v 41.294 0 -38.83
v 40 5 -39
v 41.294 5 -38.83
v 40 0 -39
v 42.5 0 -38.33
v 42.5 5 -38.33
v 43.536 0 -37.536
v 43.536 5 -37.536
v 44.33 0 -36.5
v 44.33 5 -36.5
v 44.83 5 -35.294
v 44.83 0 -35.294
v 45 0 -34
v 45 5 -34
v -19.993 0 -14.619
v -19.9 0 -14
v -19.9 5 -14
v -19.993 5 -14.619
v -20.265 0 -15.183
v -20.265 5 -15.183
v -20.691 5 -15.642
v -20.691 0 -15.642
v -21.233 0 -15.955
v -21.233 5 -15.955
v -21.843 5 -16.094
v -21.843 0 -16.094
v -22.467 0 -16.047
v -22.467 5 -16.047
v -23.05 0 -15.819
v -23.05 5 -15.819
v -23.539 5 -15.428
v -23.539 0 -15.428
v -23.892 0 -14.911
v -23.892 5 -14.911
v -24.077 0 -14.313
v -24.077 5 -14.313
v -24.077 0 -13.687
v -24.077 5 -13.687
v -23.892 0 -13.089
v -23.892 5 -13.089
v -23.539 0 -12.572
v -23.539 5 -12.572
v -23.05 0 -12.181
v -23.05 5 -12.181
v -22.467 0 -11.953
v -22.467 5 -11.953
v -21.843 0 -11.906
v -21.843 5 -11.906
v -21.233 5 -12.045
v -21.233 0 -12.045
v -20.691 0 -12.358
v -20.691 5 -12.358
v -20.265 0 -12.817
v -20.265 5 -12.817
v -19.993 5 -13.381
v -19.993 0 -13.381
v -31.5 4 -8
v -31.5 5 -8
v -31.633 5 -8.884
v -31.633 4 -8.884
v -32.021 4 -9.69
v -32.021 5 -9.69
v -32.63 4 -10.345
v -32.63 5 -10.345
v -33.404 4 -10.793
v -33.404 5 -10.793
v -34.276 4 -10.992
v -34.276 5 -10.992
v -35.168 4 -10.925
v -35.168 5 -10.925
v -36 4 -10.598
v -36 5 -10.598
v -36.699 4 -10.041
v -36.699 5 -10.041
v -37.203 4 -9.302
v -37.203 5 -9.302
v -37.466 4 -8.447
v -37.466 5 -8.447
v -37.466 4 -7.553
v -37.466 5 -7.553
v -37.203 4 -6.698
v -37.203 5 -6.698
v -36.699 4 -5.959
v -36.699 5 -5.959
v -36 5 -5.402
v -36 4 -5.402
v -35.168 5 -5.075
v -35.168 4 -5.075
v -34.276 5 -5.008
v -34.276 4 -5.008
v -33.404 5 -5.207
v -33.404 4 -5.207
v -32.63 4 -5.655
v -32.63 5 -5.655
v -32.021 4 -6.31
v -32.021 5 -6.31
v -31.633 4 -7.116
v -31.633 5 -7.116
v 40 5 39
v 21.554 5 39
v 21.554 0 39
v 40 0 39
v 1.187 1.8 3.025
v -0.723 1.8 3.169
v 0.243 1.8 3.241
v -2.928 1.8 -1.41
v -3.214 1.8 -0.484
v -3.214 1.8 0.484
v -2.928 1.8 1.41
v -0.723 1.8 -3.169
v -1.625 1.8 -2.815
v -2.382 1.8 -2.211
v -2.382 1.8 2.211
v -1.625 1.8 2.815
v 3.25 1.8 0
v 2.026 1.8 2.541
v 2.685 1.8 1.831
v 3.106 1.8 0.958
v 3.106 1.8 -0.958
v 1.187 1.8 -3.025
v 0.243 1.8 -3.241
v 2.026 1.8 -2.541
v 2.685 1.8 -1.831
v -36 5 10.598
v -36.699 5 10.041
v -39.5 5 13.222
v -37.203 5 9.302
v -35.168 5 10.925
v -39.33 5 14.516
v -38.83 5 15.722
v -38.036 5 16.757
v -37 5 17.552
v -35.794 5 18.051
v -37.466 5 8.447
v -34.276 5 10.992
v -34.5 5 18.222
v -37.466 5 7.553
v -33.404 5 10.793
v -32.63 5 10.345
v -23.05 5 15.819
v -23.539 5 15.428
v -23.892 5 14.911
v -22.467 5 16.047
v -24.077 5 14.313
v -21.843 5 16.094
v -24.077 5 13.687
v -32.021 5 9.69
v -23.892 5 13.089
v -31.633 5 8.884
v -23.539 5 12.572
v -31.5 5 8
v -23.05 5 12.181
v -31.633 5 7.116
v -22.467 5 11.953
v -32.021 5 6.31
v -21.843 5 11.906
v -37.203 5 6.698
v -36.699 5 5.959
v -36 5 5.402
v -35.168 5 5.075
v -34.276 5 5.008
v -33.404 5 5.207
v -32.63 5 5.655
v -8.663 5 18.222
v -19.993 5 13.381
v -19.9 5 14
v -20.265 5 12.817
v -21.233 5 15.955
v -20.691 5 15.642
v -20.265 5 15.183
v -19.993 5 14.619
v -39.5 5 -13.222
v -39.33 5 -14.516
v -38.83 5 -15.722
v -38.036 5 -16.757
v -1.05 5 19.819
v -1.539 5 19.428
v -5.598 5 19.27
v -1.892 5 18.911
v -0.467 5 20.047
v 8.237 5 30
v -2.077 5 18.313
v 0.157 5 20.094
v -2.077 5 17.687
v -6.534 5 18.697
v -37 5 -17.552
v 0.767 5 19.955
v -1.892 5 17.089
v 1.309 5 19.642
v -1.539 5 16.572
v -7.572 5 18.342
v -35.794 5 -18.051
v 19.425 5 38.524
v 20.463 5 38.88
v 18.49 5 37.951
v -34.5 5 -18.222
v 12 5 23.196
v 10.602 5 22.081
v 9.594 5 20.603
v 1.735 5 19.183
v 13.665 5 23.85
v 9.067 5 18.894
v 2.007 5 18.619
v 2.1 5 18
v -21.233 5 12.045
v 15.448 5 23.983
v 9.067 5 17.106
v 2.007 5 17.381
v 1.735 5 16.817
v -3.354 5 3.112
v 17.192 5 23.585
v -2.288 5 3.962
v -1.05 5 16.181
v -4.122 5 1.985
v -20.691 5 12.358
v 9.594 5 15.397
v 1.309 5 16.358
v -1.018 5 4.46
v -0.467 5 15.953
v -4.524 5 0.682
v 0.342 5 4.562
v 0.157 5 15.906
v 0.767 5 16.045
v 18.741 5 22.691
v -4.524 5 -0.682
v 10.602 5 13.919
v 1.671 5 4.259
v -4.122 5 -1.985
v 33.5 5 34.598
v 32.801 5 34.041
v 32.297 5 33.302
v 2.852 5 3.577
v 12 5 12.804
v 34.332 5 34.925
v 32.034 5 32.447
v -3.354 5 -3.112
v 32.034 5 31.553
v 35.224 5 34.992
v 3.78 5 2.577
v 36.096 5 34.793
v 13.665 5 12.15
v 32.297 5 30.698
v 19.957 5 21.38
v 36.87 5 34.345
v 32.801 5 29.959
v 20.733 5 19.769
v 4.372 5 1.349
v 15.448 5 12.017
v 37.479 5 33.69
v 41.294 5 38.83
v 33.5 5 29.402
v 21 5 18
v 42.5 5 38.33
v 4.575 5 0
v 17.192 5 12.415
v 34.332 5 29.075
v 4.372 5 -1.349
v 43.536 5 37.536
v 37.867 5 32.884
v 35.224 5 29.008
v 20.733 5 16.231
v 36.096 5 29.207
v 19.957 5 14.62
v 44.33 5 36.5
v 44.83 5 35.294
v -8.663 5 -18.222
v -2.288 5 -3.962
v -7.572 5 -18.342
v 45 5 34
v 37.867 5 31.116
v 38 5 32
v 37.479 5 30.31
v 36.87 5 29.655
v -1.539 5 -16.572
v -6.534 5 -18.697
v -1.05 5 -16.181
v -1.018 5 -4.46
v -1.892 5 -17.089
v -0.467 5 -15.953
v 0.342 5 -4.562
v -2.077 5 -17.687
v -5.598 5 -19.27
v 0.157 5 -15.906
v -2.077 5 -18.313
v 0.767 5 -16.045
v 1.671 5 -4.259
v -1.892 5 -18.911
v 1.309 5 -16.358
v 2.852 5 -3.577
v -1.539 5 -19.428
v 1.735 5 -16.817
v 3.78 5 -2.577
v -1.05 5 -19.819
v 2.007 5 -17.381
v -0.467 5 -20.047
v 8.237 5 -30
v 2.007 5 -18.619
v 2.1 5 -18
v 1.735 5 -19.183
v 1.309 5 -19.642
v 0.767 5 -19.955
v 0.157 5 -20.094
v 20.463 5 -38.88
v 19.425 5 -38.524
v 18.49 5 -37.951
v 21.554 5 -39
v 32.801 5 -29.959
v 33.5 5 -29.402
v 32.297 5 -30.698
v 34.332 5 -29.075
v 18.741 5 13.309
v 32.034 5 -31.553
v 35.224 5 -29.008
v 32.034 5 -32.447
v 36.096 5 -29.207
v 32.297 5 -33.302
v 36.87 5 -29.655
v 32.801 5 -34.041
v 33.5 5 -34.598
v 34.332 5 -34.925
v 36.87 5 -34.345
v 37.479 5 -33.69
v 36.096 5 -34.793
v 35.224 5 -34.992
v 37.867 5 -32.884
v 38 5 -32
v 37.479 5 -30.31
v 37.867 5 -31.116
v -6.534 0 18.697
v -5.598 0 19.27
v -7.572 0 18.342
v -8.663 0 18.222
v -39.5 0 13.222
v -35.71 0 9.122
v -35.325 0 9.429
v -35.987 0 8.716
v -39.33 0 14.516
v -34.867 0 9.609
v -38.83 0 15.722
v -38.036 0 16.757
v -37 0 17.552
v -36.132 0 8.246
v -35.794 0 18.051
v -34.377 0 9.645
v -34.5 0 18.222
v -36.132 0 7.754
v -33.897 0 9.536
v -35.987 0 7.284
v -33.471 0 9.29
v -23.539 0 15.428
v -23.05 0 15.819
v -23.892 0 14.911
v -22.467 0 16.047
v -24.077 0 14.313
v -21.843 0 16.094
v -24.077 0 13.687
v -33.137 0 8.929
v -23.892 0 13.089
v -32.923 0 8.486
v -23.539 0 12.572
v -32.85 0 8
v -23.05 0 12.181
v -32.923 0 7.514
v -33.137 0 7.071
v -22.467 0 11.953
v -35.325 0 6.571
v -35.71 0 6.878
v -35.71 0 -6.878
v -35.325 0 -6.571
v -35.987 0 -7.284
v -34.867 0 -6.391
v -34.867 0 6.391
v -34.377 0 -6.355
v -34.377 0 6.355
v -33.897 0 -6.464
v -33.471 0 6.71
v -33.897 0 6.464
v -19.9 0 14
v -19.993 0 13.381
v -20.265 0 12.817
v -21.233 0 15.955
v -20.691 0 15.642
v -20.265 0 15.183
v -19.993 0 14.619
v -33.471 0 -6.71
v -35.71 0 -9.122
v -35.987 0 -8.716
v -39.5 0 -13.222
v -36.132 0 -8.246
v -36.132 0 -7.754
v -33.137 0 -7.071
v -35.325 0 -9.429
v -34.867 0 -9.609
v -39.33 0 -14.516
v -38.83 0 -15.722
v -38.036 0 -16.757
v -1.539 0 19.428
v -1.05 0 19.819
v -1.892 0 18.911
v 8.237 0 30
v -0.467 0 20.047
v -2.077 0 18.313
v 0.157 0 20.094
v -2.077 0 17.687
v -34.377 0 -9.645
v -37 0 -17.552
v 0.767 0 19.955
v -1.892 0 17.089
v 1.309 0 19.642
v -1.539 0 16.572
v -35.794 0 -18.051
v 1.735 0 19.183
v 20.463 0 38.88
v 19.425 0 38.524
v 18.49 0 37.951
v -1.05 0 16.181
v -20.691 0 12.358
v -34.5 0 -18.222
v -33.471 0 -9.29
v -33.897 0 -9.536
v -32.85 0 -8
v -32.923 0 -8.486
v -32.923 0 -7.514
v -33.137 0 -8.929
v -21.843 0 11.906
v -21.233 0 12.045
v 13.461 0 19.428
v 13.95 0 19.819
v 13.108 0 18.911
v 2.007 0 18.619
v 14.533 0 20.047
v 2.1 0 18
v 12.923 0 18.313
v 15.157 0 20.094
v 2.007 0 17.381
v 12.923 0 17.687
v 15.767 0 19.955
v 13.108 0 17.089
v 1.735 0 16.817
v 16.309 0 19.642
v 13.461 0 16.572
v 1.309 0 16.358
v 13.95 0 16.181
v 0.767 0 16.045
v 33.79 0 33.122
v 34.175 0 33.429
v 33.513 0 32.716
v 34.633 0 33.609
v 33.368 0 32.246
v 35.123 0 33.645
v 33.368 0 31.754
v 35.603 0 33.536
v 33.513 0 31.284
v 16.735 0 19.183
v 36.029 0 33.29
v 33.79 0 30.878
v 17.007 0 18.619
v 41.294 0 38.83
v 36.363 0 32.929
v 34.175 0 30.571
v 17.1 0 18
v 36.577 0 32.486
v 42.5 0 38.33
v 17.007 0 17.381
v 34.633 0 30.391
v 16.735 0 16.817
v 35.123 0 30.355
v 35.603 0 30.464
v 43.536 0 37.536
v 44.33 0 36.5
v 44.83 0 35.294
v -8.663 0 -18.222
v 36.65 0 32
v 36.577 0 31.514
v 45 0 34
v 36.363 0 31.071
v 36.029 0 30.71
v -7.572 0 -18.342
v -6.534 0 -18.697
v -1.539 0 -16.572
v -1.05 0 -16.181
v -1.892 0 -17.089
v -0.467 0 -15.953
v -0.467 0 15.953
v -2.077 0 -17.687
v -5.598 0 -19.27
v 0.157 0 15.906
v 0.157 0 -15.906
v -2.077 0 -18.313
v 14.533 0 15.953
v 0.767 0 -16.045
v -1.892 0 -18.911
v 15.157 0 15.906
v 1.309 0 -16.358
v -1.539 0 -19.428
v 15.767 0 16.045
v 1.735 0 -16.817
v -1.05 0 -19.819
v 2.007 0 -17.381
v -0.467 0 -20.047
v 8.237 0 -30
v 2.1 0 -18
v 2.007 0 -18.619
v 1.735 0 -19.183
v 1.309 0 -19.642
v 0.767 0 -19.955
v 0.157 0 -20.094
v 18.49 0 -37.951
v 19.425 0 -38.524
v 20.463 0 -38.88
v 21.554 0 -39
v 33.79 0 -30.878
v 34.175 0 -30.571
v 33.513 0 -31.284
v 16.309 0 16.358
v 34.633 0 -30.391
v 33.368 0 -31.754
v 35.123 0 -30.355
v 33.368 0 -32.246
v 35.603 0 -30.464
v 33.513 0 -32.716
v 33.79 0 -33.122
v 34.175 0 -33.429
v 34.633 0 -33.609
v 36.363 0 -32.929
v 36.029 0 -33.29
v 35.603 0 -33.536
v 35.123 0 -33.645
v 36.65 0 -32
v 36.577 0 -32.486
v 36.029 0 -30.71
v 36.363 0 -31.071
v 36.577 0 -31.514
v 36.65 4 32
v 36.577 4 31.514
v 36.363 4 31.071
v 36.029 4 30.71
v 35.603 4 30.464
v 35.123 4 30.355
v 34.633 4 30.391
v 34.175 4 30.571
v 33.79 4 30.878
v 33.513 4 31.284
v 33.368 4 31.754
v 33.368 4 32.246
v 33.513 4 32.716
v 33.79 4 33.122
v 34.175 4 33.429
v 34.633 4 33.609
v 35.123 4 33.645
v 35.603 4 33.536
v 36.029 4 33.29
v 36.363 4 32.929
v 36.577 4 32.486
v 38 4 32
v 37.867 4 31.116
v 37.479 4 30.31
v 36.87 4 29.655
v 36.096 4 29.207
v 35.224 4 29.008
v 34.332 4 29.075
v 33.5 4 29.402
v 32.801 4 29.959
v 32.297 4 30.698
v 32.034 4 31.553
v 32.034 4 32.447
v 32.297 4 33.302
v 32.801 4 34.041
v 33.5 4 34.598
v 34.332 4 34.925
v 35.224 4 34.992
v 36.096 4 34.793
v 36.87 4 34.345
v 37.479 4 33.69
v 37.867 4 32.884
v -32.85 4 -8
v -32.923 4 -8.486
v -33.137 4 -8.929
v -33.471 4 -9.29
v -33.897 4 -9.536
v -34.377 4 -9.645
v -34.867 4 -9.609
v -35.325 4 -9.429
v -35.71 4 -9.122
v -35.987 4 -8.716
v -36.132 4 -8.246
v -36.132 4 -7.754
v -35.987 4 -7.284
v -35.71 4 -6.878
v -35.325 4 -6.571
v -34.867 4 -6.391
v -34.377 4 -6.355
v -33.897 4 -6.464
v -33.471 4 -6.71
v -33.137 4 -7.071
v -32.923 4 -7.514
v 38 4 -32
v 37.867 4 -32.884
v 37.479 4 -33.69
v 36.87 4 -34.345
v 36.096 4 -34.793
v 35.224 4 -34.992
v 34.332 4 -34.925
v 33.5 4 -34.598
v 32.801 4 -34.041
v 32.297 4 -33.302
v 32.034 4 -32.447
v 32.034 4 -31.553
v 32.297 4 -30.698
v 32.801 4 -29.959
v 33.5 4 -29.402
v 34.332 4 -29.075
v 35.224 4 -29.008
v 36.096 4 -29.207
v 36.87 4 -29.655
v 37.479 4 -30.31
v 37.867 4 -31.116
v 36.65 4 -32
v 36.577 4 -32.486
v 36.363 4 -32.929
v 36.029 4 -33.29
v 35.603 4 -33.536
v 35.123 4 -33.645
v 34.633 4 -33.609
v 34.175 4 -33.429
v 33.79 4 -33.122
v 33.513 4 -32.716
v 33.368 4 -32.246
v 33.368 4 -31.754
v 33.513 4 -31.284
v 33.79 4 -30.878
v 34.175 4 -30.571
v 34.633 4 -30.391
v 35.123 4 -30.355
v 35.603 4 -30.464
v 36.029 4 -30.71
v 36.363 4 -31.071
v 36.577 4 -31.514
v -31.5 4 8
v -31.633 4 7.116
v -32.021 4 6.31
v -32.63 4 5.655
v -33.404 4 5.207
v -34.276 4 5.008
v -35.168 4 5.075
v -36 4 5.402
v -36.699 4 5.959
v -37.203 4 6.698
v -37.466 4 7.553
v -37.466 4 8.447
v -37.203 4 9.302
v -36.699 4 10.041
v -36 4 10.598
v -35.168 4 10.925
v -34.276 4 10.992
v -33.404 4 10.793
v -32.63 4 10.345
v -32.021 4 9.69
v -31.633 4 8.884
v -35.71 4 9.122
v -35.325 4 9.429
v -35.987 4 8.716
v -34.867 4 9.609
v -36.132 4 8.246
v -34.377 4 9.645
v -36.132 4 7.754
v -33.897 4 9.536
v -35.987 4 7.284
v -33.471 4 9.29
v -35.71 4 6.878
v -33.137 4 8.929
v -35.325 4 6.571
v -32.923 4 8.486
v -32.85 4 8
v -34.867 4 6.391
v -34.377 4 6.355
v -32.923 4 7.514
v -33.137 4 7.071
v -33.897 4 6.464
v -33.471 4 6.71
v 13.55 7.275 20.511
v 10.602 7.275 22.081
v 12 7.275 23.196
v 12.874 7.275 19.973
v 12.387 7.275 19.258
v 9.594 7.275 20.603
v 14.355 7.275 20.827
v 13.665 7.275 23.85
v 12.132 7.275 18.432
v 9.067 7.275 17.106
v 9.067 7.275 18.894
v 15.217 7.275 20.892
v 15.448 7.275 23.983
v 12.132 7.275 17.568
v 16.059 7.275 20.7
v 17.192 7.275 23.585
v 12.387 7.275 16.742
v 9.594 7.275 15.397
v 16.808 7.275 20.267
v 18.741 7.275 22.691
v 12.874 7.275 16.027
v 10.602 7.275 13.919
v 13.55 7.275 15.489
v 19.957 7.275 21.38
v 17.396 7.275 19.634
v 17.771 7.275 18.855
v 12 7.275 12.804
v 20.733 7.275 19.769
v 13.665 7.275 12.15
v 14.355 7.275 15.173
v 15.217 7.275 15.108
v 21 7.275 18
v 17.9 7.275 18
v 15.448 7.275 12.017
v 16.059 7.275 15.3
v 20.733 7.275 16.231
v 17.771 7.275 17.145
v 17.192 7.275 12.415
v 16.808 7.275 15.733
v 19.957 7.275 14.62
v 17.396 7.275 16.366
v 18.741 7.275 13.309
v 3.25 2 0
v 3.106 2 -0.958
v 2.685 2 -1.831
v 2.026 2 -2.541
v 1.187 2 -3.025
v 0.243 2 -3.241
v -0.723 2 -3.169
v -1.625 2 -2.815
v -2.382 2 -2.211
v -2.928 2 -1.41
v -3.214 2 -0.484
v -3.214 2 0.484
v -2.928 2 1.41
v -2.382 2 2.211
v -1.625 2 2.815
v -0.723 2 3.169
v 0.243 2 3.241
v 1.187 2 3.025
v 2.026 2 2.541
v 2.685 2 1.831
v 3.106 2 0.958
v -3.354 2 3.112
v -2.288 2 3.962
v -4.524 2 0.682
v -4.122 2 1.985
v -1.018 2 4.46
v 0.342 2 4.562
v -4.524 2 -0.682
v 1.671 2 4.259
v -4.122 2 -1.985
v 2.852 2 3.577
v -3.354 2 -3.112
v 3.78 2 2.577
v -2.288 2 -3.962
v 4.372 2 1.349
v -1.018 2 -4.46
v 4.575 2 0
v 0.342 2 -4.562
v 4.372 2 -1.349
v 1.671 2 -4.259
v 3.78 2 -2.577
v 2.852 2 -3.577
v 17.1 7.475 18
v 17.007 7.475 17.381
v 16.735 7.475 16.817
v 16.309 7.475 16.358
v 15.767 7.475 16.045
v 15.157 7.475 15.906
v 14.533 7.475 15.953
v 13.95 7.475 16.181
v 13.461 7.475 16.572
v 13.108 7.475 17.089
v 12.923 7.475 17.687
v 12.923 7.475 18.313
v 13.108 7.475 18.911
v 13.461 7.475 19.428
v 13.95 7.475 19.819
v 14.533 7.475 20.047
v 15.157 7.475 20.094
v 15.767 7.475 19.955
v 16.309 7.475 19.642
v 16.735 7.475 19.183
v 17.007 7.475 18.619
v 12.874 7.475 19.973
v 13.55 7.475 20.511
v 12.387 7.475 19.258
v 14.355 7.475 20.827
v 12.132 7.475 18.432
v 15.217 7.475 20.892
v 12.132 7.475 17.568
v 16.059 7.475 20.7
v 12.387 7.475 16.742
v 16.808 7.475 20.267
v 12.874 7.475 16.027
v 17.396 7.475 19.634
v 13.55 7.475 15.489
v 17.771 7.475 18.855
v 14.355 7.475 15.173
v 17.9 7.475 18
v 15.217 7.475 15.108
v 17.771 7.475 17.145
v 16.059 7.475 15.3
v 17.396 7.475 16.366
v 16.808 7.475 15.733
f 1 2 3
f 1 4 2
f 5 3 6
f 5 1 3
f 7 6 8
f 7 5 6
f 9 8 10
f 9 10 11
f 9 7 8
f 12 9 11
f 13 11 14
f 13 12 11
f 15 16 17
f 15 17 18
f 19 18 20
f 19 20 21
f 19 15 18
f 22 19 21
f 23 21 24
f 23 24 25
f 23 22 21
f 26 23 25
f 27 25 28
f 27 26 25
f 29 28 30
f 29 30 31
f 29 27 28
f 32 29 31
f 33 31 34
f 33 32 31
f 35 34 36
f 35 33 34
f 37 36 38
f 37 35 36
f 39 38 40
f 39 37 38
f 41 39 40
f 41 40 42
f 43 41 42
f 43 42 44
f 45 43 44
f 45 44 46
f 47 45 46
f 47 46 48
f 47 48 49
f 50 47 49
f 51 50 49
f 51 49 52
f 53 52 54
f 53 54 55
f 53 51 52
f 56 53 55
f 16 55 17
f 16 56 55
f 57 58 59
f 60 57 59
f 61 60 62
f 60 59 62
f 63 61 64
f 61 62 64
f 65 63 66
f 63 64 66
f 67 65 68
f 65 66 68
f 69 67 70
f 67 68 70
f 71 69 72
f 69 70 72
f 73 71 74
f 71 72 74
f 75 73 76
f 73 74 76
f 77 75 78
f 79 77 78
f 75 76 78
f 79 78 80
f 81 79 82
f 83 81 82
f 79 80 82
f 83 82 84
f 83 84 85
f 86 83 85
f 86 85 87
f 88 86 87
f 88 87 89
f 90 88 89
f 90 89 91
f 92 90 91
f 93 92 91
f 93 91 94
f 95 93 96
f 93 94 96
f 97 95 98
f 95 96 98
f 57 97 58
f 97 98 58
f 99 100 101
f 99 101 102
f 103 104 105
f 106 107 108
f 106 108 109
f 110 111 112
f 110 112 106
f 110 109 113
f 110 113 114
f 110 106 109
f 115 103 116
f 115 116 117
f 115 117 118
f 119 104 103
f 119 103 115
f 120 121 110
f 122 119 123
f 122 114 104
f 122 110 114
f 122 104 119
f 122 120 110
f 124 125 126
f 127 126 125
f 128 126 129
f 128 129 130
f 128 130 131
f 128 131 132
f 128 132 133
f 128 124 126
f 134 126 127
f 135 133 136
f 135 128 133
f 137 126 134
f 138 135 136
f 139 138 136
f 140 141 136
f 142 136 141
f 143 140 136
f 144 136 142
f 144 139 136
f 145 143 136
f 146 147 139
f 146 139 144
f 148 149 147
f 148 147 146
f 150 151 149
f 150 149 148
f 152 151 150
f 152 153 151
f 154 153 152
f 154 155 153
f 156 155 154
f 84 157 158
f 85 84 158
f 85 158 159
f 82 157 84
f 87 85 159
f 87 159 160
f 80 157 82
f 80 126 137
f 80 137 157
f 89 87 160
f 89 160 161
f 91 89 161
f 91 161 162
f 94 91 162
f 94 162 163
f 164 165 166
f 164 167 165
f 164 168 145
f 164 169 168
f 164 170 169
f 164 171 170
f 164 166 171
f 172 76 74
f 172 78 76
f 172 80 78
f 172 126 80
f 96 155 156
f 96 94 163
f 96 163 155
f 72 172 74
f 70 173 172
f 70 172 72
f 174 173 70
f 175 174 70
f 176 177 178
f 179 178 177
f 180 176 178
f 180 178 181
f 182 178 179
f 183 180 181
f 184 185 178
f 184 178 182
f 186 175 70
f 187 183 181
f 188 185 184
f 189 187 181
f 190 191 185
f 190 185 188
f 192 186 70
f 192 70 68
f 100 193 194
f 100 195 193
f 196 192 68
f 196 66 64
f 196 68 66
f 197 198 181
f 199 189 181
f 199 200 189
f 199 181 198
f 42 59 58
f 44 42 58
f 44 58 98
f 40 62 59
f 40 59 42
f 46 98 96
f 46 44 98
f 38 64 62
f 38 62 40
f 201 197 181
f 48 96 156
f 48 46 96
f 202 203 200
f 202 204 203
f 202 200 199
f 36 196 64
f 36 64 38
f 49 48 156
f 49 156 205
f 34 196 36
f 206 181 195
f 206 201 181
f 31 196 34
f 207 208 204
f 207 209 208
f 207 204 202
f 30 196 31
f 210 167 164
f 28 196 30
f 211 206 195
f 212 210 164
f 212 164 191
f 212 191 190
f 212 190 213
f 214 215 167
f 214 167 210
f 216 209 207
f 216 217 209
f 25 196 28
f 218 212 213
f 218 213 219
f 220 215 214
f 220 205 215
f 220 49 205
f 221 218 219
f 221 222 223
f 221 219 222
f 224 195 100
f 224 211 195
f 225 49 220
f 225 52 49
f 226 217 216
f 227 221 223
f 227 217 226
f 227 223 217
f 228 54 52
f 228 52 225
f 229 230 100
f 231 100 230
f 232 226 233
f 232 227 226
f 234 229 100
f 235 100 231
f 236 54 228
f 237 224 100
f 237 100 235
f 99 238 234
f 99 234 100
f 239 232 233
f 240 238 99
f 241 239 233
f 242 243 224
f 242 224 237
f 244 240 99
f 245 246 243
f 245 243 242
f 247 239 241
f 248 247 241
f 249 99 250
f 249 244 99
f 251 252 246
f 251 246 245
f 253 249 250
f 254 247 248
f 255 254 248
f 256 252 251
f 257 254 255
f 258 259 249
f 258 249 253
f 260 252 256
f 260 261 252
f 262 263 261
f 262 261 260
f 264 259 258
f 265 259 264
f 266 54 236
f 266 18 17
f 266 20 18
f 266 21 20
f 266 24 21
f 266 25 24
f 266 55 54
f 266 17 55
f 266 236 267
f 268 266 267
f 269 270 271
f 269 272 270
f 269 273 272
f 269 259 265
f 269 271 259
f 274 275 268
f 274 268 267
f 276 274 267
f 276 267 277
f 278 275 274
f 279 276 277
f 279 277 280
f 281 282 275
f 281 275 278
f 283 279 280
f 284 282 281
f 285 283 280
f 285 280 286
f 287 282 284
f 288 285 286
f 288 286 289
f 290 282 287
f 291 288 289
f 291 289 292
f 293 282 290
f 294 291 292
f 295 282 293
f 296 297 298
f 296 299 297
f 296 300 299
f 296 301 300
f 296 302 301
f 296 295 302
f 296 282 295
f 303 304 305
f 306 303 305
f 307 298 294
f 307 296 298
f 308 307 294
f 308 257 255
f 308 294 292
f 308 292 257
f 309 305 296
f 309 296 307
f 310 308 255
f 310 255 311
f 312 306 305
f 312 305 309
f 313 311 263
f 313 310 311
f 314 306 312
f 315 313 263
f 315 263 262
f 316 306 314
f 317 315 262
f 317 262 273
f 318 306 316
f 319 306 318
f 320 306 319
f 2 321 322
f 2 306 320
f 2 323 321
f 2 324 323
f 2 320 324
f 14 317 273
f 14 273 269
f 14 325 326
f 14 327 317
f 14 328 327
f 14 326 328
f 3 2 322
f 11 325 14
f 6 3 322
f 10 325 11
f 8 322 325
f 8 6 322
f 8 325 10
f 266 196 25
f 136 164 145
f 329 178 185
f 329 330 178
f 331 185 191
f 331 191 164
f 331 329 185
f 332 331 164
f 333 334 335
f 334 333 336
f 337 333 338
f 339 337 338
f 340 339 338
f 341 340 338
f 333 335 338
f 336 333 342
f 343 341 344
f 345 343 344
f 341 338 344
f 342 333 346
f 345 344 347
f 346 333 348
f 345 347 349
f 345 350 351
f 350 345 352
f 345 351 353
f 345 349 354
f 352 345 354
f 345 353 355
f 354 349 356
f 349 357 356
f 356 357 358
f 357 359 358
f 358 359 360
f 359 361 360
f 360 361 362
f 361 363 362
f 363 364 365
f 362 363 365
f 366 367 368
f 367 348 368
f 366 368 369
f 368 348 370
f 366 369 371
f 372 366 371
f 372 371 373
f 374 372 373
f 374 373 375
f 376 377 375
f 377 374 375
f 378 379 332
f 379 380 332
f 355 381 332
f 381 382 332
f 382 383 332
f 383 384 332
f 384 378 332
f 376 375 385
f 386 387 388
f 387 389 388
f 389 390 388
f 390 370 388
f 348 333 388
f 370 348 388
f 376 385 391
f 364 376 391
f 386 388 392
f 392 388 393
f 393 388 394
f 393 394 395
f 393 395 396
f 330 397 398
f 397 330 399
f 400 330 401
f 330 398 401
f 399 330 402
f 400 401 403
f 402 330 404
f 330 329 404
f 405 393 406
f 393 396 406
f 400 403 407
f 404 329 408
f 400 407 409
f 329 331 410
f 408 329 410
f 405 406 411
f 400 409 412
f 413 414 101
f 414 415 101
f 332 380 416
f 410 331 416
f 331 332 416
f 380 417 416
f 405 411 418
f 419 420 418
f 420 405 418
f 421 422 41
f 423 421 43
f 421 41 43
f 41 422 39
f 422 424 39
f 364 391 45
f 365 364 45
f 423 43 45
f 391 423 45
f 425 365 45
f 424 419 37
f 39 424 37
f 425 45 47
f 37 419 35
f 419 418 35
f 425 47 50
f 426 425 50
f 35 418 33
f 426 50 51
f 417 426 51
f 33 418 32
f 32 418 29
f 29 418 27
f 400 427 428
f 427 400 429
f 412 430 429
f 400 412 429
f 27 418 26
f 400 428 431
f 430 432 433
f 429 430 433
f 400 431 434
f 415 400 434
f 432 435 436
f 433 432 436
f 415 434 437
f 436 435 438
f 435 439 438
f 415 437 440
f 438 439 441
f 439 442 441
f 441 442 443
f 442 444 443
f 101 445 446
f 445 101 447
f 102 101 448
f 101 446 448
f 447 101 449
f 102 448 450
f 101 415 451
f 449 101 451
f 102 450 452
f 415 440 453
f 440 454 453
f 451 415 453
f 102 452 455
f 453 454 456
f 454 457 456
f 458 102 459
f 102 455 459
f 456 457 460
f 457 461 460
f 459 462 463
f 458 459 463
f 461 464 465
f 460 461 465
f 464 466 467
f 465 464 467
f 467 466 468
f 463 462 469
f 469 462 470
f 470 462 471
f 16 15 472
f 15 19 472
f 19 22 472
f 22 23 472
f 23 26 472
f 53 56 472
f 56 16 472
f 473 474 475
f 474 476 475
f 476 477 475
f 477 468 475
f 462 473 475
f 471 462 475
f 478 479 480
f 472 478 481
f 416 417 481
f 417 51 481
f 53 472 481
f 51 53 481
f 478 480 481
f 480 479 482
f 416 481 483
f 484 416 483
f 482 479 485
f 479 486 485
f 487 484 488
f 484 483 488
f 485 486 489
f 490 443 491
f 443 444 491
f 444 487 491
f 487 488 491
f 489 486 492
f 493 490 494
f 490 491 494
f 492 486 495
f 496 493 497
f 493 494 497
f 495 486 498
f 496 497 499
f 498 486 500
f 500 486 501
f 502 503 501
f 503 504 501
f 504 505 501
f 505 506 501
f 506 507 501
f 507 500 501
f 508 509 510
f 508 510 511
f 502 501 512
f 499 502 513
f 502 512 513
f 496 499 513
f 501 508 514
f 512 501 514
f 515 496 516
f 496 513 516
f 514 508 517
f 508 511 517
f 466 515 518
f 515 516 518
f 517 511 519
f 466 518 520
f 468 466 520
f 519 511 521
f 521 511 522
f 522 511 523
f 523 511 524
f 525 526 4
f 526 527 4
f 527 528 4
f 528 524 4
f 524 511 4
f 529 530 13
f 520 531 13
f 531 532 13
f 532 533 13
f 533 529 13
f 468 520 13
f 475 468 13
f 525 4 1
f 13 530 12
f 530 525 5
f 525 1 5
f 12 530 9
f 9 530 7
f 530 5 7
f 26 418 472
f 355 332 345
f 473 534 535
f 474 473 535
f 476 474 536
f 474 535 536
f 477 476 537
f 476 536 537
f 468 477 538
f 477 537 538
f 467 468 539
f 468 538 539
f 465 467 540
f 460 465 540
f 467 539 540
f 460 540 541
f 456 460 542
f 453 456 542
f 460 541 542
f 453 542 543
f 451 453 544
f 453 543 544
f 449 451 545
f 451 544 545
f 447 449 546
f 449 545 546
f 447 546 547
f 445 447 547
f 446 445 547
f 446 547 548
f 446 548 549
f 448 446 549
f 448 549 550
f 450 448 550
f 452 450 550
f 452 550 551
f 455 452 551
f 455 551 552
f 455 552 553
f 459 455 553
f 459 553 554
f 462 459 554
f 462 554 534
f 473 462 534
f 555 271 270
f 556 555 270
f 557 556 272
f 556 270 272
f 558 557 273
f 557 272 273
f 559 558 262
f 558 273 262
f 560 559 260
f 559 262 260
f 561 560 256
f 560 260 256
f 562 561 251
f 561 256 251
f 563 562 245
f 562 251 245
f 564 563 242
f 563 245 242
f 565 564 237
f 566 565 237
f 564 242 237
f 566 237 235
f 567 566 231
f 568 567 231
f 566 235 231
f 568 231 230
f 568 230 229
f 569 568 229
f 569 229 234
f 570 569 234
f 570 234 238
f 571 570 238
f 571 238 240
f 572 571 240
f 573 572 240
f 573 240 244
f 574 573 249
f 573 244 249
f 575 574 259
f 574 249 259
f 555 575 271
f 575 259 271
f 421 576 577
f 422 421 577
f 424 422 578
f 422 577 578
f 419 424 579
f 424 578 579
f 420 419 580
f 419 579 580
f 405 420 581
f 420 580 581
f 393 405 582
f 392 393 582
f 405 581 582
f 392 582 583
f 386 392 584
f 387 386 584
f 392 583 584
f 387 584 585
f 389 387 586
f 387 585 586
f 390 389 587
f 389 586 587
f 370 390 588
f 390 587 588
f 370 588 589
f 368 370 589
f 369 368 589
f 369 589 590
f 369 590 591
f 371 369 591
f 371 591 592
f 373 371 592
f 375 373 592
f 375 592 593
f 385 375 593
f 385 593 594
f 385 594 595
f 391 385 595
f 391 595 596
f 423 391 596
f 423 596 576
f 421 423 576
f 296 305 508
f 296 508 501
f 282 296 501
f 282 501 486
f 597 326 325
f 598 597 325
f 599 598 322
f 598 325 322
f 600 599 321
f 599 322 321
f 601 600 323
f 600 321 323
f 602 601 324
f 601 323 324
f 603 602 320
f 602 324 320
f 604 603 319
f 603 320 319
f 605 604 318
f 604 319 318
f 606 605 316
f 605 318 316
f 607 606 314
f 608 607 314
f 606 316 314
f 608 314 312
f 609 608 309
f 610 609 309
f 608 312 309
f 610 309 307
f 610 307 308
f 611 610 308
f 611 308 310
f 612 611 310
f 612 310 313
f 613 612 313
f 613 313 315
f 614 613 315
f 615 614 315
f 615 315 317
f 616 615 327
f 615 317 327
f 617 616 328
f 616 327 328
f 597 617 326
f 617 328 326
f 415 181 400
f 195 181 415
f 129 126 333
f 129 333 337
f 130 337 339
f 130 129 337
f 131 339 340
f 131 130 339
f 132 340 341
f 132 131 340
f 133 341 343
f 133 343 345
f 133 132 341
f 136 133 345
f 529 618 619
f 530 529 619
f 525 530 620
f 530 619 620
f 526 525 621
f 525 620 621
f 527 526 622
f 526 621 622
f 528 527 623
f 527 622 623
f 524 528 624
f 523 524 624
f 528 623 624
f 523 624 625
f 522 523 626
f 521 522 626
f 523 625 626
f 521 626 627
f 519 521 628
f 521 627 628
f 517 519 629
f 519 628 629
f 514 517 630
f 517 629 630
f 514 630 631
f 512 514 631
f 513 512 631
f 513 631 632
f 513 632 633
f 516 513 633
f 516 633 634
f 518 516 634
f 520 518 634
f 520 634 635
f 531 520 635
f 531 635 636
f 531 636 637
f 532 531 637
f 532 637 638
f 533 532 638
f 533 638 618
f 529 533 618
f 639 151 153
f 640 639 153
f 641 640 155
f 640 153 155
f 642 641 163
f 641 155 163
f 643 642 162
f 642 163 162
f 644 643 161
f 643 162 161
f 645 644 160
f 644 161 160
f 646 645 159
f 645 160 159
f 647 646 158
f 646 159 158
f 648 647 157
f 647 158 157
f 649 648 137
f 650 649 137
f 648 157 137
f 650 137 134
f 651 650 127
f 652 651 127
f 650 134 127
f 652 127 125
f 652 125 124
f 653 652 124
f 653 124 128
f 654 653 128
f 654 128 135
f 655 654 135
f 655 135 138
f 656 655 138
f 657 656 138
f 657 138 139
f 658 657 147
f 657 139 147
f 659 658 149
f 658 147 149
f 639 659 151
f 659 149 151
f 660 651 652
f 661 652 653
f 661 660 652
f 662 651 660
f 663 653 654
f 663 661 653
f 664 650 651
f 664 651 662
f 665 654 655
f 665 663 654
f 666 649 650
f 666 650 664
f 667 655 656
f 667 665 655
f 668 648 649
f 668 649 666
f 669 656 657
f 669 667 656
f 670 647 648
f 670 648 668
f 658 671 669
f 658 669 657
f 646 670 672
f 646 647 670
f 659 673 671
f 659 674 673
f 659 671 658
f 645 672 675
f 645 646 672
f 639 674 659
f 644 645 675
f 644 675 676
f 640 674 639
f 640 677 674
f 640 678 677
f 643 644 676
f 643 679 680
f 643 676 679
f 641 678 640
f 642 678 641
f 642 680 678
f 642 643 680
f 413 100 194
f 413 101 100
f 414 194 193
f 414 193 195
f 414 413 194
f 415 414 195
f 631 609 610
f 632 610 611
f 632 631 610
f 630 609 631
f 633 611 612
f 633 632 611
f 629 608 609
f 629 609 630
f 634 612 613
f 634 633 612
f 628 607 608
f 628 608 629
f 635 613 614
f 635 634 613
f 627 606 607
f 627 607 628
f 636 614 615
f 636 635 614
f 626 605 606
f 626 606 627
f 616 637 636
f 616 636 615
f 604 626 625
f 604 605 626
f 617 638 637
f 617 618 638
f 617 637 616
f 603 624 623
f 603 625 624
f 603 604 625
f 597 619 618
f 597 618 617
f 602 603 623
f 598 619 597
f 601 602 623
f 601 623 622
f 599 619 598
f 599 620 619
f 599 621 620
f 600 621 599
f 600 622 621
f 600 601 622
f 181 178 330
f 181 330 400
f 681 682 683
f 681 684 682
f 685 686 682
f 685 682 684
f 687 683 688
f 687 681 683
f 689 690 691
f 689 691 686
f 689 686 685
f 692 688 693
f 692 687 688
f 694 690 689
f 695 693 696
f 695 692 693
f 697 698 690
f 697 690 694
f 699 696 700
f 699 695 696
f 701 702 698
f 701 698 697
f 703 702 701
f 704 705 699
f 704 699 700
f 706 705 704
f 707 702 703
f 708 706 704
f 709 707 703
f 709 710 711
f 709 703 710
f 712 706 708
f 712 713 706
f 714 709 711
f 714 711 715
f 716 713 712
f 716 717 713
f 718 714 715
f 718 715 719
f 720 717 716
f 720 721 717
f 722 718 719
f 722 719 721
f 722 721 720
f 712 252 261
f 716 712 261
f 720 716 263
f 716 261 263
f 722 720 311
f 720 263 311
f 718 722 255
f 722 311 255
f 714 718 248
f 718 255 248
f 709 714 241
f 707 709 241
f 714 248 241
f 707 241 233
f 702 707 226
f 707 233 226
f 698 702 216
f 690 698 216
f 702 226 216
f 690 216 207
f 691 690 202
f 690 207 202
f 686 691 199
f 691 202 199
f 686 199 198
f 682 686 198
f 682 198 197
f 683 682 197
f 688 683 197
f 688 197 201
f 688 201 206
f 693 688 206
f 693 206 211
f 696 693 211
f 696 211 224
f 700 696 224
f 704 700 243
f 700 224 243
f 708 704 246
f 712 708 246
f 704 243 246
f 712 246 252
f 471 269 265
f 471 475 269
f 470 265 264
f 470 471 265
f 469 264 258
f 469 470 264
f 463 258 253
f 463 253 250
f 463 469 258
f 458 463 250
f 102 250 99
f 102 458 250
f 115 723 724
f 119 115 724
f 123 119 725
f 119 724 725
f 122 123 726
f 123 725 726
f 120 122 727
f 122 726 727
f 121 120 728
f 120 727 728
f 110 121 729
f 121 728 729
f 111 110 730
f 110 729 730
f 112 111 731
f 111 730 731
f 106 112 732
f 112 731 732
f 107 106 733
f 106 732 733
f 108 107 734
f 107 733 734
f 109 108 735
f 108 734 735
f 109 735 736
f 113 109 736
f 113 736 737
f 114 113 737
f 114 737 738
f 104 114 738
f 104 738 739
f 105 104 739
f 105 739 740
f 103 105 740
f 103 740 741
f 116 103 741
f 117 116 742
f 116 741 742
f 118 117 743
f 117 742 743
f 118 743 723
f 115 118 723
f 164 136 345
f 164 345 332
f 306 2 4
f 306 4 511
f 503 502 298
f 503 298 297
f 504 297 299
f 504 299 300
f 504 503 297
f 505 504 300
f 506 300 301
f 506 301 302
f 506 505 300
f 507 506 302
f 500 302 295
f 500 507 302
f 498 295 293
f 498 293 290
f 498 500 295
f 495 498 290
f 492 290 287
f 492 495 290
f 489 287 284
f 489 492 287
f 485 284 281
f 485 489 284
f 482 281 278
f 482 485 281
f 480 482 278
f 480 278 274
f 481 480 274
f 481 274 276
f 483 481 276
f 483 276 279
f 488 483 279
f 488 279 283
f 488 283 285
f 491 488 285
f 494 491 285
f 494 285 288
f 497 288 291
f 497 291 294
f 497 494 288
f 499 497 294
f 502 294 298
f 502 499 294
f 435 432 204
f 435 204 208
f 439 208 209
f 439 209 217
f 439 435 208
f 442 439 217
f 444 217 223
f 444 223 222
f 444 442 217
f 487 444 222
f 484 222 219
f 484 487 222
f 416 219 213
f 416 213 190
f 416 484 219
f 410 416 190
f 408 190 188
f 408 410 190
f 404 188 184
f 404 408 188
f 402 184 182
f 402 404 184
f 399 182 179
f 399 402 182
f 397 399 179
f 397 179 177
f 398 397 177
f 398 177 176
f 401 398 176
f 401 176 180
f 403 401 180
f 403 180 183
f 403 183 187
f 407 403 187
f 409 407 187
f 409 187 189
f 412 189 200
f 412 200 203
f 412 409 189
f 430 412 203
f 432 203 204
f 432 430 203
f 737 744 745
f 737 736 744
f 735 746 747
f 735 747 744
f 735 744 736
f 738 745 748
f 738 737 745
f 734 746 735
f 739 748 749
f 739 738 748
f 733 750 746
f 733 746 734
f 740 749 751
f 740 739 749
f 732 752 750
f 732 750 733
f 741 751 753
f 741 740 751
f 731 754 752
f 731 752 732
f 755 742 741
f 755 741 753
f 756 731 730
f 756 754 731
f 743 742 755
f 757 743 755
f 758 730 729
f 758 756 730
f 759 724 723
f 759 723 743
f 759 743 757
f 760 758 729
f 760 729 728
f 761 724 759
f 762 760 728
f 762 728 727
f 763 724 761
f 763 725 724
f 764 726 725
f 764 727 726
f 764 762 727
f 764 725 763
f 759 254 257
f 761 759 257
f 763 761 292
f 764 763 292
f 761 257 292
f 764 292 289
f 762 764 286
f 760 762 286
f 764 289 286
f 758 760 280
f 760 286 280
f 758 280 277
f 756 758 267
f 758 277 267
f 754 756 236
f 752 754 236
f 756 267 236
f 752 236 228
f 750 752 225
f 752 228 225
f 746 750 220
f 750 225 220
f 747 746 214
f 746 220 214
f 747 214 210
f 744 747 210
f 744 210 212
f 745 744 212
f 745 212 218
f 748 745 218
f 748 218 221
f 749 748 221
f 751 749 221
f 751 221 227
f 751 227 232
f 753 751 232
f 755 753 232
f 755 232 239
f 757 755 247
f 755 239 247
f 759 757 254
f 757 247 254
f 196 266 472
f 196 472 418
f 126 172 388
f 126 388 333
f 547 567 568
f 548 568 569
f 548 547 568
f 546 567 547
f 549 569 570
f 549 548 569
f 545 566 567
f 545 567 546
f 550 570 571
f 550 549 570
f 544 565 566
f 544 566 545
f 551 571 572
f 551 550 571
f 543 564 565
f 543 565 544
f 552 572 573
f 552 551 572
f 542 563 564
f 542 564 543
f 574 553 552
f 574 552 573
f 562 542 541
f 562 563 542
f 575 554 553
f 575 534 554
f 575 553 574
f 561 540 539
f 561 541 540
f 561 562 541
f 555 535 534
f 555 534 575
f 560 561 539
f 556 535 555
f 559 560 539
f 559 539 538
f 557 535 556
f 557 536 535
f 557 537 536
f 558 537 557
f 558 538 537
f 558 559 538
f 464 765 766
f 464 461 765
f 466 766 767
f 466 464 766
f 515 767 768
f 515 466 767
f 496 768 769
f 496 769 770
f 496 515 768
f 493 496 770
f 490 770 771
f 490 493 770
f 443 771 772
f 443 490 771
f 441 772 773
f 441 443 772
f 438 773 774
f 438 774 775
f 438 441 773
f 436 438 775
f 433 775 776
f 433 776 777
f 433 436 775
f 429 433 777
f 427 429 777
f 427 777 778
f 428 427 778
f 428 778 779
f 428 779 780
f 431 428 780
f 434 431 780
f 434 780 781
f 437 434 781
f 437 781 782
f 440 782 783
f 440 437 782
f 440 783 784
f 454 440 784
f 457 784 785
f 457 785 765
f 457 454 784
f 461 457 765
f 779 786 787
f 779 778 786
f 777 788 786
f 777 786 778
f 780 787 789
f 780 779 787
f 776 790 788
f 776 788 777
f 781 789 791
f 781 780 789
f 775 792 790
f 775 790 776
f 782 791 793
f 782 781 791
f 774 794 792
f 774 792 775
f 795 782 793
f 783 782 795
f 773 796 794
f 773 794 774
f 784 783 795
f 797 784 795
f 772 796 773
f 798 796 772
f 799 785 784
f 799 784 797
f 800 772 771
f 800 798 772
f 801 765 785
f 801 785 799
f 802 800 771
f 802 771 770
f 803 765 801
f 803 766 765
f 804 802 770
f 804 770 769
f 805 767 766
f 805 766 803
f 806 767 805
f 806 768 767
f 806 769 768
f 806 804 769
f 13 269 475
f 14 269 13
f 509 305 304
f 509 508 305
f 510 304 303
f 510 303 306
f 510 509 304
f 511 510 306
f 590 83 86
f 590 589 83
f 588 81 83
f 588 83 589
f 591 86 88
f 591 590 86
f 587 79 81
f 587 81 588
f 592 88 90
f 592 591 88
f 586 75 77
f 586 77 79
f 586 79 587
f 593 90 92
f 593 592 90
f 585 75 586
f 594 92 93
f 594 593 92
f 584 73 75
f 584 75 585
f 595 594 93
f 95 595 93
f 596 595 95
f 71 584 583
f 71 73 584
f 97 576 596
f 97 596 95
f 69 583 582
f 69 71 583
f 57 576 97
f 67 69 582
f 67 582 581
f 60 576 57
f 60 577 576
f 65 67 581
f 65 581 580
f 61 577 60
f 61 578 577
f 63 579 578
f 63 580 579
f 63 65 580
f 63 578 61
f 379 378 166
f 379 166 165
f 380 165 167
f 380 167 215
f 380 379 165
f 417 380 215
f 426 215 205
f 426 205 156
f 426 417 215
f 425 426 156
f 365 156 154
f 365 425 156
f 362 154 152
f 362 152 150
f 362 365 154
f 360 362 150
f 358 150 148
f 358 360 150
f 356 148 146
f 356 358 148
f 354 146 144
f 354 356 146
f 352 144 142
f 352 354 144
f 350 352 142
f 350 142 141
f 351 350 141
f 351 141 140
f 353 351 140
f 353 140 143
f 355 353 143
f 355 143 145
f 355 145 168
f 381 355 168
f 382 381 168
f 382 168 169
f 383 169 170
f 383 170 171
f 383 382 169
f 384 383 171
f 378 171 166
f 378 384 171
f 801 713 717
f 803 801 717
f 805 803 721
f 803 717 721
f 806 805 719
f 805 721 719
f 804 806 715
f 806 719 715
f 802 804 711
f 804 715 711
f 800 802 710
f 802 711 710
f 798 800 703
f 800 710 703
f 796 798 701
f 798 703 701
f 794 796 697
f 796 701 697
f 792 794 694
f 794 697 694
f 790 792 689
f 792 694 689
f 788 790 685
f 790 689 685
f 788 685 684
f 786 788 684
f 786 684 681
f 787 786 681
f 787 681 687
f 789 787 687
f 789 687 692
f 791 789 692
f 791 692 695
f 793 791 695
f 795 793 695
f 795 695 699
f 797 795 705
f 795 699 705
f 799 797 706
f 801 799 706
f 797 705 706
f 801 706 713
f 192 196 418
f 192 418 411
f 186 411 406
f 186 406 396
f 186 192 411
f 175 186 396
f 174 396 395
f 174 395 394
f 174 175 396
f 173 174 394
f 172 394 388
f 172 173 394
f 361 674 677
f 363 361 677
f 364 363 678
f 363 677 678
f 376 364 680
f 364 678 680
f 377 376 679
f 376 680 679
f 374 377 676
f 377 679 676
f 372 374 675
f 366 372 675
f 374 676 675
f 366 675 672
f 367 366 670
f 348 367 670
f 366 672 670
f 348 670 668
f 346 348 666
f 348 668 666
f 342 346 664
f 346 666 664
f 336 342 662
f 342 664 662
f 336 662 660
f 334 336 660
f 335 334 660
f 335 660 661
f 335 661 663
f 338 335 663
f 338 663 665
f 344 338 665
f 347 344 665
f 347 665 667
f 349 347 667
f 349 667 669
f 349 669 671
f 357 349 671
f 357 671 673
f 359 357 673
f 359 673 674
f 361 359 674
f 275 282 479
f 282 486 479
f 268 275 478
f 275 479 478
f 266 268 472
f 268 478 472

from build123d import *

# Parameters (mm, degrees)
SKETCH1_W           = 115
SKETCH1_H           = 60
SKETCH1_R           = 2.1
BOSS_EXTRUDE1_DEPTH = 5
SKETCH2_R           = 4.575
CUT_EXTRUDE1_DEPTH  = 3
SKETCH3_R           = 3.25
CUT_EXTRUDE2_DEPTH  = 0.2
SKETCH4_R           = 1.65
CUT_EXTRUDE3_DEPTH  = 6
CUT_EXTRUDE4_DEPTH  = 6
BOSS_EXTRUDE2_DEPTH = 5
SKETCH8_R           = 1.65
CUT_EXTRUDE5_DEPTH  = 6
FILLET1_R           = 5
SKETCH9_R           = 6
SKETCH9_R_2         = 2.1
BOSS_EXTRUDE3_DEPTH = 2.275
SKETCH10_R          = 2.9
SKETCH10_R_2        = 2.1
BOSS_EXTRUDE4_DEPTH = 0.2
SKETCH11_R          = 3
CUT_EXTRUDE6_DEPTH  = 1


with BuildPart() as part:
    # Sketch1 → Boss-Extrude1 (new body)
    with BuildSketch(Plane(origin=(0, 0, 0), x_dir=(1, 0, 0), z_dir=(0, 1, 0))):
        with Locations((-12.5, 0)):
            Rectangle(SKETCH1_W, SKETCH1_H)
        with Locations((-22, 14)):
            Circle(SKETCH1_R, mode=Mode.SUBTRACT)
        with Locations((0, 18)):
            Circle(SKETCH1_R, mode=Mode.SUBTRACT)
        with Locations((0, -18)):
            Circle(SKETCH1_R, mode=Mode.SUBTRACT)
        with Locations((-22, -14)):
            Circle(SKETCH1_R, mode=Mode.SUBTRACT)
        with Locations((15, -18)):
            Circle(SKETCH1_R, mode=Mode.SUBTRACT)
    extrude(amount=BOSS_EXTRUDE1_DEPTH)

    # Sketch2 → Cut-Extrude1 (cut)
    with BuildSketch(Plane(origin=(0, 5, 0), x_dir=(1, 0, 0), z_dir=(0, 1, 0))):
        Circle(SKETCH2_R)
    extrude(amount=-CUT_EXTRUDE1_DEPTH, mode=Mode.SUBTRACT)

    # Sketch3 → Cut-Extrude2 (cut)
    with BuildSketch(Plane(origin=(0, 2, 0), x_dir=(1, 0, 0), z_dir=(0, 1, 0))):
        Circle(SKETCH3_R)
    extrude(amount=-CUT_EXTRUDE2_DEPTH, mode=Mode.SUBTRACT)

    # Sketch4 → Cut-Extrude3 (cut, through all)
    with BuildSketch(Plane(origin=(0, 5, 0), x_dir=(1, 0, 0), z_dir=(0, 1, 0))):
        with Locations((-34.5, -8)):
            Circle(SKETCH4_R)
        with Locations((-34.5, 8)):
            Circle(SKETCH4_R)
    extrude(amount=-CUT_EXTRUDE3_DEPTH, mode=Mode.SUBTRACT)

    # Sketch6 → Cut-Extrude4 (cut, through all)
    with BuildSketch(Plane(origin=(0, 5, 0), x_dir=(1, 0, 0), z_dir=(0, 1, 0))):
        with BuildLine():
            Line((-22, 18.221576202), (-34.5, 18.221576202))
            ThreePointArc((-34.5, 18.221576202), (-38.035533906, 16.757110108), (-39.5, 13.221576202))
            Line((-39.5, 13.221576202), (-39.5, -13.221576202))
            ThreePointArc((-39.5, -13.221576202), (-38.035533906, -16.757110108), (-34.5, -18.221576202))
            Line((-34.5, -18.221576202), (-22, -18.221576202))
            Line((-22, -18.221576202), (-8.297519941, -18.221576202))
            Line((-8.297519941, -18.221576202), (-6.951019319, -18.221576202))
            Line((-6.951019319, -18.221576202), (19.301199277, -38.580439602))
            Line((19.301199277, -38.580439602), (-22, -30))
            Line((-22, -30), (-70, -30))
            Line((-70, -30), (-70, 30))
            Line((-70, 30), (-22, 30))
            Line((-22, 30), (19.301199277, 38.580439602))
            Line((19.301199277, 38.580439602), (-6.951019319, 18.221576202))
            Line((-6.951019319, 18.221576202), (-8.297519941, 18.221576202))
            Line((-8.297519941, 18.221576202), (-22, 18.221576202))
        make_face()
    extrude(amount=-CUT_EXTRUDE4_DEPTH, mode=Mode.SUBTRACT)

    # Sketch7 → Boss-Extrude2 (add)
    with BuildSketch(Plane(origin=(0, 5, 0), x_dir=(1, 0, 0), z_dir=(0, 1, 0))):
        Polygon((19.842211368, 39), (8.23694821, 30), (45, 30), (45, 39), align=None)
        Polygon((45, -30), (8.23694821, -30), (19.842211368, -39), (45, -39), align=None)
    extrude(amount=-BOSS_EXTRUDE2_DEPTH)

    # Sketch8 → Cut-Extrude5 (cut, through all)
    with BuildSketch(Plane(origin=(0, 5, 0), x_dir=(1, 0, 0), z_dir=(0, 1, 0))):
        with Locations((35, 32)):
            Circle(SKETCH8_R)
        with Locations((35, -32)):
            Circle(SKETCH8_R)
    extrude(amount=-CUT_EXTRUDE5_DEPTH, mode=Mode.SUBTRACT)

    # Fillet1
    fillet1_edges = [part.edges().sort_by_distance(p)[0] for p in [
        (45, 2.5, -39),
        (19.842211368, 2.5, -39),
        (19.842211368, 2.5, 39),
        (45, 2.5, 39),
        (-6.951019319, 2.5, 18.221576202),
        (-6.951019319, 2.5, -18.221576202),
    ]]
    fillet(fillet1_edges, radius=FILLET1_R)

    # Sketch9 → Boss-Extrude3 (add)
    with BuildSketch(Plane(origin=(0, 5, 0), x_dir=(1, 0, 0), z_dir=(0, 1, 0))):
        with Locations((15, -18)):
            Circle(SKETCH9_R)
        with Locations((15, -18)):
            Circle(SKETCH9_R_2, mode=Mode.SUBTRACT)
    extrude(amount=BOSS_EXTRUDE3_DEPTH)

    # Sketch10 → Boss-Extrude4 (add)
    with BuildSketch(Plane(origin=(0, 7.275, 0), x_dir=(1, 0, 0), z_dir=(0, 1, 0))):
        with Locations((15, -18)):
            Circle(SKETCH10_R)
        with Locations((15, -18)):
            Circle(SKETCH10_R_2, mode=Mode.SUBTRACT)
    extrude(amount=BOSS_EXTRUDE4_DEPTH)

    # Sketch11 → Cut-Extrude6 (cut)
    with BuildSketch(Plane(origin=(0, 5, 0), x_dir=(1, 0, 0), z_dir=(0, 1, 0))):
        with Locations((-34.5, 8)):
            Circle(SKETCH11_R)
        with Locations((-34.5, -8)):
            Circle(SKETCH11_R)
        with Locations((35, -32)):
            Circle(SKETCH11_R)
        with Locations((35, 32)):
            Circle(SKETCH11_R)
    extrude(amount=-CUT_EXTRUDE6_DEPTH, mode=Mode.SUBTRACT)


solid = part.part
